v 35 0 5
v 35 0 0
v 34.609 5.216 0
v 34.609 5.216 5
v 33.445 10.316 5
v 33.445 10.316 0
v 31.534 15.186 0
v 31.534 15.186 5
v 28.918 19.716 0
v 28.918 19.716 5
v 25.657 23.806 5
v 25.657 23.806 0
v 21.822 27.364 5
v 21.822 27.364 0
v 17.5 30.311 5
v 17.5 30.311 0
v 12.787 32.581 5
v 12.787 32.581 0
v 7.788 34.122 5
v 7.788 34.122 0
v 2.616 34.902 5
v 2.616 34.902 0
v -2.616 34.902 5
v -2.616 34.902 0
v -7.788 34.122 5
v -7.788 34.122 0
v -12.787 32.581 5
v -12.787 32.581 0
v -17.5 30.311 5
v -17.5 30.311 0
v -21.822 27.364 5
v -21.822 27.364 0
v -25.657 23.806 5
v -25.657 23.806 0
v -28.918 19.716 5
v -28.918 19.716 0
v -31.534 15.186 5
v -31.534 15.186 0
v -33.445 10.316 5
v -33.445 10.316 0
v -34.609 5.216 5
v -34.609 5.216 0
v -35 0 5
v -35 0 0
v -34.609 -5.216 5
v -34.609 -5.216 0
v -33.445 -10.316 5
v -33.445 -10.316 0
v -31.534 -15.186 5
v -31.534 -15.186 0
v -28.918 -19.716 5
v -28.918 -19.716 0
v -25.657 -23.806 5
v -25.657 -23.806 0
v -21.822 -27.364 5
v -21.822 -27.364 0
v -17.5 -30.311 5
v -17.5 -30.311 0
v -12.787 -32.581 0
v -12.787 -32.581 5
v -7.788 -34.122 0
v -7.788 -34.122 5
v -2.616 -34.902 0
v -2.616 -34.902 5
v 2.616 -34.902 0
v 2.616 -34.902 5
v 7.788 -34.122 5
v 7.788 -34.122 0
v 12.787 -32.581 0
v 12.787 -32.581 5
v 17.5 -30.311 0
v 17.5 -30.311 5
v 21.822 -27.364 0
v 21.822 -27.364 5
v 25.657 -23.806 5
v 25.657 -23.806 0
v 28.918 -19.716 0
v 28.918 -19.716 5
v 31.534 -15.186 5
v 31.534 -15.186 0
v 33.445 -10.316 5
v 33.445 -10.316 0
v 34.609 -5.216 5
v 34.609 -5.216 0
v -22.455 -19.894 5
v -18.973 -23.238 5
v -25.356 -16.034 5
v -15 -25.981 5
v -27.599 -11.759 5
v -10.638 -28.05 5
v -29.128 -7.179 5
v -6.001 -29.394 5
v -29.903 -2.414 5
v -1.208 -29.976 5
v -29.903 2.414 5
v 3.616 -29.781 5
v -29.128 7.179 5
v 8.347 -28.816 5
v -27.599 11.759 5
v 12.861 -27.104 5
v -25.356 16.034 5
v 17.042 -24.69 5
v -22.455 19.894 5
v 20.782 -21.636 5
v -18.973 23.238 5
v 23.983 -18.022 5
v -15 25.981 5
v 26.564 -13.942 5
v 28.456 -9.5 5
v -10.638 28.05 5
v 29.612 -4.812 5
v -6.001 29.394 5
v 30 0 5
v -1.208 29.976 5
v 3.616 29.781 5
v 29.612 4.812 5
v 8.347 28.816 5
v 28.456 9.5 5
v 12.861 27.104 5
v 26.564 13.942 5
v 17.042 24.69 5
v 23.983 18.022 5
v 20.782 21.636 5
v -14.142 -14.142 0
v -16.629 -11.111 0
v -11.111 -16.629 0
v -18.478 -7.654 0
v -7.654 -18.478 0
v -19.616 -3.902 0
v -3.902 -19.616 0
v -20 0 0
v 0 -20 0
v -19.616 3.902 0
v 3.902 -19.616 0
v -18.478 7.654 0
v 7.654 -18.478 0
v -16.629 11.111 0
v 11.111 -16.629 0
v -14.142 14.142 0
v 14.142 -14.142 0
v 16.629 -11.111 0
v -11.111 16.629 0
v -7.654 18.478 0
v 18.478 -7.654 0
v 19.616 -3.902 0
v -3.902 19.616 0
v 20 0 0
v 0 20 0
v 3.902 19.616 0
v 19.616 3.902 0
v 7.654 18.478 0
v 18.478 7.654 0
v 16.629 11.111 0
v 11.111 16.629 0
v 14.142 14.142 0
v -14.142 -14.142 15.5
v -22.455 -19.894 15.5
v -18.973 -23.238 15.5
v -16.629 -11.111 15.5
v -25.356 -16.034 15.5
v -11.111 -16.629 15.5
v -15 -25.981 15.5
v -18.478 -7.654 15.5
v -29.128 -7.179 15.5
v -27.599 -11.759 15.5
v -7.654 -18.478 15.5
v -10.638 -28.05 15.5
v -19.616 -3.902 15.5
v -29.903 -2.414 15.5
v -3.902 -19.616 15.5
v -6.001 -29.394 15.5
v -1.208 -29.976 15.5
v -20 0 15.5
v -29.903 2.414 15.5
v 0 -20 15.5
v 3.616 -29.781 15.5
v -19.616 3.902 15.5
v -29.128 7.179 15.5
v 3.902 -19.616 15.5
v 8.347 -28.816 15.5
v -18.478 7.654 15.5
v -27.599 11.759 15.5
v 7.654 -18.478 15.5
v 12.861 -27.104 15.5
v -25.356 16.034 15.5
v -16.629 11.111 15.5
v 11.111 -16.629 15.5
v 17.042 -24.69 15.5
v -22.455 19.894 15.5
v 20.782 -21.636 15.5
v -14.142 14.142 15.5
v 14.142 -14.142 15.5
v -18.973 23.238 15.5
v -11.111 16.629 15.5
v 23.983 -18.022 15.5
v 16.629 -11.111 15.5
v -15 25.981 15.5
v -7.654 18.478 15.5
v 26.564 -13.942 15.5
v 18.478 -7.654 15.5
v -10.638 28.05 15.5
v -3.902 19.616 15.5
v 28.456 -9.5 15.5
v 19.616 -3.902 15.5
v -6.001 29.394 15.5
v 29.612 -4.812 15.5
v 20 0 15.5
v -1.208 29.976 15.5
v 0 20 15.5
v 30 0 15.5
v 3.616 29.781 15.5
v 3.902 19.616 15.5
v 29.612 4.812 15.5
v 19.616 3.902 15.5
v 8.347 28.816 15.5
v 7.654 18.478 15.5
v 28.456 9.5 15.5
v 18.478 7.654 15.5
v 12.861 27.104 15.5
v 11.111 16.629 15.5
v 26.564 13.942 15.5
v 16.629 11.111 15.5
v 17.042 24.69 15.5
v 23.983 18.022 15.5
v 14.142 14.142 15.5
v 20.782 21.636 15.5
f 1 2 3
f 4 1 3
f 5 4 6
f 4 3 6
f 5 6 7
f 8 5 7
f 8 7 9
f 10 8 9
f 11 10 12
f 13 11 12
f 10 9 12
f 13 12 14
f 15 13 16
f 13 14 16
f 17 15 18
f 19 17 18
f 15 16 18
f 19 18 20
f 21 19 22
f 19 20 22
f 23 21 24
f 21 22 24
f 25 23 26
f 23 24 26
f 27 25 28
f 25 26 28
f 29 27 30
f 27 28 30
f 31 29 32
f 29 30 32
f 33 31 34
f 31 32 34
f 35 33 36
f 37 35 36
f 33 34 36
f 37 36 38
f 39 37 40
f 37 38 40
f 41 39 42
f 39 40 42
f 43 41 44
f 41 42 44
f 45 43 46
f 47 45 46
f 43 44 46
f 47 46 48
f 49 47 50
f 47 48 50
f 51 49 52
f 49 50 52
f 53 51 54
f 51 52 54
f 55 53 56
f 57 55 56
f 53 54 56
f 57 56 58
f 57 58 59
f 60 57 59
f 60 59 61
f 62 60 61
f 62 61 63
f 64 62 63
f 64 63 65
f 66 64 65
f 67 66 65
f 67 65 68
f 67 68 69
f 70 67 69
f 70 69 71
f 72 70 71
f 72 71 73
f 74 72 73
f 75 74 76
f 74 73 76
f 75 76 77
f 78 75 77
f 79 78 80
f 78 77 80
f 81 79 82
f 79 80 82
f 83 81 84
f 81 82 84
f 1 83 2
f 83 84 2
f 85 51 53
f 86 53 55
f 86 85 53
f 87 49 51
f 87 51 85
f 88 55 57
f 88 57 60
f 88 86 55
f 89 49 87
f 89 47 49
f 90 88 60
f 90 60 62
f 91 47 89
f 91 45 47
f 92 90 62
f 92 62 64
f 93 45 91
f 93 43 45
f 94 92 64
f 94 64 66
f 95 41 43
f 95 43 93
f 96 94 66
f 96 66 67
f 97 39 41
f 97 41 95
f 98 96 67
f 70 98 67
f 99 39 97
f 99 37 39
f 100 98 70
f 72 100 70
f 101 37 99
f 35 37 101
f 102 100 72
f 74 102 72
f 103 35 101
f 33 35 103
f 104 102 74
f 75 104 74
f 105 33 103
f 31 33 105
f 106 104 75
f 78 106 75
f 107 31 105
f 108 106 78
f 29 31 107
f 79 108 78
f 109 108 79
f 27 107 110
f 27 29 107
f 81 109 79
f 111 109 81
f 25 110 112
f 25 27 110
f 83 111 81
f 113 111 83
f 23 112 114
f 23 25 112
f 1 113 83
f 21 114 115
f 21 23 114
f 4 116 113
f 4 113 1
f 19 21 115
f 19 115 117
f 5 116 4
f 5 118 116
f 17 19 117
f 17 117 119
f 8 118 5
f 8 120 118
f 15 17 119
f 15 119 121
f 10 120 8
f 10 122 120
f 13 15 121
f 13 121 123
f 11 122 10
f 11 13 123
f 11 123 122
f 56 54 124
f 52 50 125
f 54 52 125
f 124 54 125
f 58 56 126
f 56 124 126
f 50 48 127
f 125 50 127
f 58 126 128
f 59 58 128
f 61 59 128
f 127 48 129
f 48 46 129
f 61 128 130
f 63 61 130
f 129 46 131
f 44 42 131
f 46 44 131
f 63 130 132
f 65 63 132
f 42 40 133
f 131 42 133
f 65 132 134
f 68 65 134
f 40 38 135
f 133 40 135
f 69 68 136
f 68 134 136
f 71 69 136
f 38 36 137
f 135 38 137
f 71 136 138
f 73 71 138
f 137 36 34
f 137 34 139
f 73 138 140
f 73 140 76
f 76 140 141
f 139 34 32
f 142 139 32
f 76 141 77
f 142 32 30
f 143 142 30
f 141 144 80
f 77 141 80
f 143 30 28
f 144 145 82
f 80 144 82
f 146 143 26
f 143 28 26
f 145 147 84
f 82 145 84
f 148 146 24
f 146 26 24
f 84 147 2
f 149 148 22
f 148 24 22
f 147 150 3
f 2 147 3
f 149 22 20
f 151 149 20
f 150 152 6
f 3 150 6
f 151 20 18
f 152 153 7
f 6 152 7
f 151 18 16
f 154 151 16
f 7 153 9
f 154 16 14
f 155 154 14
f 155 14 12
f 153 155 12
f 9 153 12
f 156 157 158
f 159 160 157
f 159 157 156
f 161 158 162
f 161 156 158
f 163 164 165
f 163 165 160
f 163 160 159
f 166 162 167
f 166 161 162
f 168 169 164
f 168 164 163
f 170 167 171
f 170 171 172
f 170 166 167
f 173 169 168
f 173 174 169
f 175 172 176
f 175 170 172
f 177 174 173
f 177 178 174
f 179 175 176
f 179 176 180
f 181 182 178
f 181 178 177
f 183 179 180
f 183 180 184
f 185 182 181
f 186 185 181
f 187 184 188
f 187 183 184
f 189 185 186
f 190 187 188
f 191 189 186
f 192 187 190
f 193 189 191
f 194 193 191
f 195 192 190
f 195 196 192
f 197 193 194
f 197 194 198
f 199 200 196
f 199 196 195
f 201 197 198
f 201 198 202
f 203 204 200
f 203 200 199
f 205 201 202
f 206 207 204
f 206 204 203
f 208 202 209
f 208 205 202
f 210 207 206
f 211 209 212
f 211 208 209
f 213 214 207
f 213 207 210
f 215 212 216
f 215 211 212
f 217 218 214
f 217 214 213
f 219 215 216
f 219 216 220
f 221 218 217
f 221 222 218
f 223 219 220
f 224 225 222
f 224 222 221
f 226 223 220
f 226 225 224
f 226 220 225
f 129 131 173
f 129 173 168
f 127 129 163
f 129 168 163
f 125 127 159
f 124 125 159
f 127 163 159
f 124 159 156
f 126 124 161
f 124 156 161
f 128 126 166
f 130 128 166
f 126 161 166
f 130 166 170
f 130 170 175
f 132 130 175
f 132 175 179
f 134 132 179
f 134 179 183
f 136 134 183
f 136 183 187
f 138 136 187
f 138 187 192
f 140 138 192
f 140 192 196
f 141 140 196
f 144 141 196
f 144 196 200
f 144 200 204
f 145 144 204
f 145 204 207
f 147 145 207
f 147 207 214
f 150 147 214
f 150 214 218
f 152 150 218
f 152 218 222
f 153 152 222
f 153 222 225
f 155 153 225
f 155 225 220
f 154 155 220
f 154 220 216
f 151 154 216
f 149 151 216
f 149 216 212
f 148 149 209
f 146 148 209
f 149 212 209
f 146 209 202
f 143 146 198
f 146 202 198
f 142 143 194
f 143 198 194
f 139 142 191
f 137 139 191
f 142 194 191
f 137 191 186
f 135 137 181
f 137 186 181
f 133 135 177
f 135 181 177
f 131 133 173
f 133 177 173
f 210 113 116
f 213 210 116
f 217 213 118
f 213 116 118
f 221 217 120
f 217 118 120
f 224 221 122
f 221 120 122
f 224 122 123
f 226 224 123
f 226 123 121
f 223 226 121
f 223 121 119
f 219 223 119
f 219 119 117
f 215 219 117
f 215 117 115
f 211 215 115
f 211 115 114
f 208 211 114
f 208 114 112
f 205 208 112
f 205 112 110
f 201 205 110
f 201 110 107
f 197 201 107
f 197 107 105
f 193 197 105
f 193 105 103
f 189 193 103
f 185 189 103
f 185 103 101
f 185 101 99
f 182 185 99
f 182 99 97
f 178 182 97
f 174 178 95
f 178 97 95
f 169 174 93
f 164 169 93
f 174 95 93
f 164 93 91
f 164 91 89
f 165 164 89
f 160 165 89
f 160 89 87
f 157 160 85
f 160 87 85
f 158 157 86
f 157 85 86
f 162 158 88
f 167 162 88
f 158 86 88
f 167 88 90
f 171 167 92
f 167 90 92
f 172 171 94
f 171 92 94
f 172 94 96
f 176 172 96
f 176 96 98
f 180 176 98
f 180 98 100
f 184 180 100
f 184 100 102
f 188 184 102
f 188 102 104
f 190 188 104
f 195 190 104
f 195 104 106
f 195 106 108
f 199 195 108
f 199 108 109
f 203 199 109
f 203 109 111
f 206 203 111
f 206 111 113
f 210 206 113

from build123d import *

# Parameters (mm, degrees)
F0_R     = 30
F1_DEPTH = 15.5
F2_R     = 35
F4_DEPTH = 5
F3_R     = 20
F5_DEPTH = 25.4
F6_D     = 40


with BuildPart() as f1:
    # F0 (on Top) → F1 (new body)
    with BuildSketch(Plane.XY):
        Circle(F0_R)
    extrude(amount=F1_DEPTH)

    # F2 (on Top) → F4 (join)
    with BuildSketch(Plane.XY):
        Circle(F2_R)
    extrude(amount=F4_DEPTH)

    # F3 (on Top) → F5 (join)
    with BuildSketch(Plane.XY):
        Circle(F3_R)
    extrude(amount=F5_DEPTH)

    # F6 (through all)
    with Locations(Plane(origin=(0, 0, 0), x_dir=(1, 0, 0), z_dir=(0, 0, -1))):
        with Locations((0, 0)):
            Hole(F6_D / 2)


solid = f1.part
